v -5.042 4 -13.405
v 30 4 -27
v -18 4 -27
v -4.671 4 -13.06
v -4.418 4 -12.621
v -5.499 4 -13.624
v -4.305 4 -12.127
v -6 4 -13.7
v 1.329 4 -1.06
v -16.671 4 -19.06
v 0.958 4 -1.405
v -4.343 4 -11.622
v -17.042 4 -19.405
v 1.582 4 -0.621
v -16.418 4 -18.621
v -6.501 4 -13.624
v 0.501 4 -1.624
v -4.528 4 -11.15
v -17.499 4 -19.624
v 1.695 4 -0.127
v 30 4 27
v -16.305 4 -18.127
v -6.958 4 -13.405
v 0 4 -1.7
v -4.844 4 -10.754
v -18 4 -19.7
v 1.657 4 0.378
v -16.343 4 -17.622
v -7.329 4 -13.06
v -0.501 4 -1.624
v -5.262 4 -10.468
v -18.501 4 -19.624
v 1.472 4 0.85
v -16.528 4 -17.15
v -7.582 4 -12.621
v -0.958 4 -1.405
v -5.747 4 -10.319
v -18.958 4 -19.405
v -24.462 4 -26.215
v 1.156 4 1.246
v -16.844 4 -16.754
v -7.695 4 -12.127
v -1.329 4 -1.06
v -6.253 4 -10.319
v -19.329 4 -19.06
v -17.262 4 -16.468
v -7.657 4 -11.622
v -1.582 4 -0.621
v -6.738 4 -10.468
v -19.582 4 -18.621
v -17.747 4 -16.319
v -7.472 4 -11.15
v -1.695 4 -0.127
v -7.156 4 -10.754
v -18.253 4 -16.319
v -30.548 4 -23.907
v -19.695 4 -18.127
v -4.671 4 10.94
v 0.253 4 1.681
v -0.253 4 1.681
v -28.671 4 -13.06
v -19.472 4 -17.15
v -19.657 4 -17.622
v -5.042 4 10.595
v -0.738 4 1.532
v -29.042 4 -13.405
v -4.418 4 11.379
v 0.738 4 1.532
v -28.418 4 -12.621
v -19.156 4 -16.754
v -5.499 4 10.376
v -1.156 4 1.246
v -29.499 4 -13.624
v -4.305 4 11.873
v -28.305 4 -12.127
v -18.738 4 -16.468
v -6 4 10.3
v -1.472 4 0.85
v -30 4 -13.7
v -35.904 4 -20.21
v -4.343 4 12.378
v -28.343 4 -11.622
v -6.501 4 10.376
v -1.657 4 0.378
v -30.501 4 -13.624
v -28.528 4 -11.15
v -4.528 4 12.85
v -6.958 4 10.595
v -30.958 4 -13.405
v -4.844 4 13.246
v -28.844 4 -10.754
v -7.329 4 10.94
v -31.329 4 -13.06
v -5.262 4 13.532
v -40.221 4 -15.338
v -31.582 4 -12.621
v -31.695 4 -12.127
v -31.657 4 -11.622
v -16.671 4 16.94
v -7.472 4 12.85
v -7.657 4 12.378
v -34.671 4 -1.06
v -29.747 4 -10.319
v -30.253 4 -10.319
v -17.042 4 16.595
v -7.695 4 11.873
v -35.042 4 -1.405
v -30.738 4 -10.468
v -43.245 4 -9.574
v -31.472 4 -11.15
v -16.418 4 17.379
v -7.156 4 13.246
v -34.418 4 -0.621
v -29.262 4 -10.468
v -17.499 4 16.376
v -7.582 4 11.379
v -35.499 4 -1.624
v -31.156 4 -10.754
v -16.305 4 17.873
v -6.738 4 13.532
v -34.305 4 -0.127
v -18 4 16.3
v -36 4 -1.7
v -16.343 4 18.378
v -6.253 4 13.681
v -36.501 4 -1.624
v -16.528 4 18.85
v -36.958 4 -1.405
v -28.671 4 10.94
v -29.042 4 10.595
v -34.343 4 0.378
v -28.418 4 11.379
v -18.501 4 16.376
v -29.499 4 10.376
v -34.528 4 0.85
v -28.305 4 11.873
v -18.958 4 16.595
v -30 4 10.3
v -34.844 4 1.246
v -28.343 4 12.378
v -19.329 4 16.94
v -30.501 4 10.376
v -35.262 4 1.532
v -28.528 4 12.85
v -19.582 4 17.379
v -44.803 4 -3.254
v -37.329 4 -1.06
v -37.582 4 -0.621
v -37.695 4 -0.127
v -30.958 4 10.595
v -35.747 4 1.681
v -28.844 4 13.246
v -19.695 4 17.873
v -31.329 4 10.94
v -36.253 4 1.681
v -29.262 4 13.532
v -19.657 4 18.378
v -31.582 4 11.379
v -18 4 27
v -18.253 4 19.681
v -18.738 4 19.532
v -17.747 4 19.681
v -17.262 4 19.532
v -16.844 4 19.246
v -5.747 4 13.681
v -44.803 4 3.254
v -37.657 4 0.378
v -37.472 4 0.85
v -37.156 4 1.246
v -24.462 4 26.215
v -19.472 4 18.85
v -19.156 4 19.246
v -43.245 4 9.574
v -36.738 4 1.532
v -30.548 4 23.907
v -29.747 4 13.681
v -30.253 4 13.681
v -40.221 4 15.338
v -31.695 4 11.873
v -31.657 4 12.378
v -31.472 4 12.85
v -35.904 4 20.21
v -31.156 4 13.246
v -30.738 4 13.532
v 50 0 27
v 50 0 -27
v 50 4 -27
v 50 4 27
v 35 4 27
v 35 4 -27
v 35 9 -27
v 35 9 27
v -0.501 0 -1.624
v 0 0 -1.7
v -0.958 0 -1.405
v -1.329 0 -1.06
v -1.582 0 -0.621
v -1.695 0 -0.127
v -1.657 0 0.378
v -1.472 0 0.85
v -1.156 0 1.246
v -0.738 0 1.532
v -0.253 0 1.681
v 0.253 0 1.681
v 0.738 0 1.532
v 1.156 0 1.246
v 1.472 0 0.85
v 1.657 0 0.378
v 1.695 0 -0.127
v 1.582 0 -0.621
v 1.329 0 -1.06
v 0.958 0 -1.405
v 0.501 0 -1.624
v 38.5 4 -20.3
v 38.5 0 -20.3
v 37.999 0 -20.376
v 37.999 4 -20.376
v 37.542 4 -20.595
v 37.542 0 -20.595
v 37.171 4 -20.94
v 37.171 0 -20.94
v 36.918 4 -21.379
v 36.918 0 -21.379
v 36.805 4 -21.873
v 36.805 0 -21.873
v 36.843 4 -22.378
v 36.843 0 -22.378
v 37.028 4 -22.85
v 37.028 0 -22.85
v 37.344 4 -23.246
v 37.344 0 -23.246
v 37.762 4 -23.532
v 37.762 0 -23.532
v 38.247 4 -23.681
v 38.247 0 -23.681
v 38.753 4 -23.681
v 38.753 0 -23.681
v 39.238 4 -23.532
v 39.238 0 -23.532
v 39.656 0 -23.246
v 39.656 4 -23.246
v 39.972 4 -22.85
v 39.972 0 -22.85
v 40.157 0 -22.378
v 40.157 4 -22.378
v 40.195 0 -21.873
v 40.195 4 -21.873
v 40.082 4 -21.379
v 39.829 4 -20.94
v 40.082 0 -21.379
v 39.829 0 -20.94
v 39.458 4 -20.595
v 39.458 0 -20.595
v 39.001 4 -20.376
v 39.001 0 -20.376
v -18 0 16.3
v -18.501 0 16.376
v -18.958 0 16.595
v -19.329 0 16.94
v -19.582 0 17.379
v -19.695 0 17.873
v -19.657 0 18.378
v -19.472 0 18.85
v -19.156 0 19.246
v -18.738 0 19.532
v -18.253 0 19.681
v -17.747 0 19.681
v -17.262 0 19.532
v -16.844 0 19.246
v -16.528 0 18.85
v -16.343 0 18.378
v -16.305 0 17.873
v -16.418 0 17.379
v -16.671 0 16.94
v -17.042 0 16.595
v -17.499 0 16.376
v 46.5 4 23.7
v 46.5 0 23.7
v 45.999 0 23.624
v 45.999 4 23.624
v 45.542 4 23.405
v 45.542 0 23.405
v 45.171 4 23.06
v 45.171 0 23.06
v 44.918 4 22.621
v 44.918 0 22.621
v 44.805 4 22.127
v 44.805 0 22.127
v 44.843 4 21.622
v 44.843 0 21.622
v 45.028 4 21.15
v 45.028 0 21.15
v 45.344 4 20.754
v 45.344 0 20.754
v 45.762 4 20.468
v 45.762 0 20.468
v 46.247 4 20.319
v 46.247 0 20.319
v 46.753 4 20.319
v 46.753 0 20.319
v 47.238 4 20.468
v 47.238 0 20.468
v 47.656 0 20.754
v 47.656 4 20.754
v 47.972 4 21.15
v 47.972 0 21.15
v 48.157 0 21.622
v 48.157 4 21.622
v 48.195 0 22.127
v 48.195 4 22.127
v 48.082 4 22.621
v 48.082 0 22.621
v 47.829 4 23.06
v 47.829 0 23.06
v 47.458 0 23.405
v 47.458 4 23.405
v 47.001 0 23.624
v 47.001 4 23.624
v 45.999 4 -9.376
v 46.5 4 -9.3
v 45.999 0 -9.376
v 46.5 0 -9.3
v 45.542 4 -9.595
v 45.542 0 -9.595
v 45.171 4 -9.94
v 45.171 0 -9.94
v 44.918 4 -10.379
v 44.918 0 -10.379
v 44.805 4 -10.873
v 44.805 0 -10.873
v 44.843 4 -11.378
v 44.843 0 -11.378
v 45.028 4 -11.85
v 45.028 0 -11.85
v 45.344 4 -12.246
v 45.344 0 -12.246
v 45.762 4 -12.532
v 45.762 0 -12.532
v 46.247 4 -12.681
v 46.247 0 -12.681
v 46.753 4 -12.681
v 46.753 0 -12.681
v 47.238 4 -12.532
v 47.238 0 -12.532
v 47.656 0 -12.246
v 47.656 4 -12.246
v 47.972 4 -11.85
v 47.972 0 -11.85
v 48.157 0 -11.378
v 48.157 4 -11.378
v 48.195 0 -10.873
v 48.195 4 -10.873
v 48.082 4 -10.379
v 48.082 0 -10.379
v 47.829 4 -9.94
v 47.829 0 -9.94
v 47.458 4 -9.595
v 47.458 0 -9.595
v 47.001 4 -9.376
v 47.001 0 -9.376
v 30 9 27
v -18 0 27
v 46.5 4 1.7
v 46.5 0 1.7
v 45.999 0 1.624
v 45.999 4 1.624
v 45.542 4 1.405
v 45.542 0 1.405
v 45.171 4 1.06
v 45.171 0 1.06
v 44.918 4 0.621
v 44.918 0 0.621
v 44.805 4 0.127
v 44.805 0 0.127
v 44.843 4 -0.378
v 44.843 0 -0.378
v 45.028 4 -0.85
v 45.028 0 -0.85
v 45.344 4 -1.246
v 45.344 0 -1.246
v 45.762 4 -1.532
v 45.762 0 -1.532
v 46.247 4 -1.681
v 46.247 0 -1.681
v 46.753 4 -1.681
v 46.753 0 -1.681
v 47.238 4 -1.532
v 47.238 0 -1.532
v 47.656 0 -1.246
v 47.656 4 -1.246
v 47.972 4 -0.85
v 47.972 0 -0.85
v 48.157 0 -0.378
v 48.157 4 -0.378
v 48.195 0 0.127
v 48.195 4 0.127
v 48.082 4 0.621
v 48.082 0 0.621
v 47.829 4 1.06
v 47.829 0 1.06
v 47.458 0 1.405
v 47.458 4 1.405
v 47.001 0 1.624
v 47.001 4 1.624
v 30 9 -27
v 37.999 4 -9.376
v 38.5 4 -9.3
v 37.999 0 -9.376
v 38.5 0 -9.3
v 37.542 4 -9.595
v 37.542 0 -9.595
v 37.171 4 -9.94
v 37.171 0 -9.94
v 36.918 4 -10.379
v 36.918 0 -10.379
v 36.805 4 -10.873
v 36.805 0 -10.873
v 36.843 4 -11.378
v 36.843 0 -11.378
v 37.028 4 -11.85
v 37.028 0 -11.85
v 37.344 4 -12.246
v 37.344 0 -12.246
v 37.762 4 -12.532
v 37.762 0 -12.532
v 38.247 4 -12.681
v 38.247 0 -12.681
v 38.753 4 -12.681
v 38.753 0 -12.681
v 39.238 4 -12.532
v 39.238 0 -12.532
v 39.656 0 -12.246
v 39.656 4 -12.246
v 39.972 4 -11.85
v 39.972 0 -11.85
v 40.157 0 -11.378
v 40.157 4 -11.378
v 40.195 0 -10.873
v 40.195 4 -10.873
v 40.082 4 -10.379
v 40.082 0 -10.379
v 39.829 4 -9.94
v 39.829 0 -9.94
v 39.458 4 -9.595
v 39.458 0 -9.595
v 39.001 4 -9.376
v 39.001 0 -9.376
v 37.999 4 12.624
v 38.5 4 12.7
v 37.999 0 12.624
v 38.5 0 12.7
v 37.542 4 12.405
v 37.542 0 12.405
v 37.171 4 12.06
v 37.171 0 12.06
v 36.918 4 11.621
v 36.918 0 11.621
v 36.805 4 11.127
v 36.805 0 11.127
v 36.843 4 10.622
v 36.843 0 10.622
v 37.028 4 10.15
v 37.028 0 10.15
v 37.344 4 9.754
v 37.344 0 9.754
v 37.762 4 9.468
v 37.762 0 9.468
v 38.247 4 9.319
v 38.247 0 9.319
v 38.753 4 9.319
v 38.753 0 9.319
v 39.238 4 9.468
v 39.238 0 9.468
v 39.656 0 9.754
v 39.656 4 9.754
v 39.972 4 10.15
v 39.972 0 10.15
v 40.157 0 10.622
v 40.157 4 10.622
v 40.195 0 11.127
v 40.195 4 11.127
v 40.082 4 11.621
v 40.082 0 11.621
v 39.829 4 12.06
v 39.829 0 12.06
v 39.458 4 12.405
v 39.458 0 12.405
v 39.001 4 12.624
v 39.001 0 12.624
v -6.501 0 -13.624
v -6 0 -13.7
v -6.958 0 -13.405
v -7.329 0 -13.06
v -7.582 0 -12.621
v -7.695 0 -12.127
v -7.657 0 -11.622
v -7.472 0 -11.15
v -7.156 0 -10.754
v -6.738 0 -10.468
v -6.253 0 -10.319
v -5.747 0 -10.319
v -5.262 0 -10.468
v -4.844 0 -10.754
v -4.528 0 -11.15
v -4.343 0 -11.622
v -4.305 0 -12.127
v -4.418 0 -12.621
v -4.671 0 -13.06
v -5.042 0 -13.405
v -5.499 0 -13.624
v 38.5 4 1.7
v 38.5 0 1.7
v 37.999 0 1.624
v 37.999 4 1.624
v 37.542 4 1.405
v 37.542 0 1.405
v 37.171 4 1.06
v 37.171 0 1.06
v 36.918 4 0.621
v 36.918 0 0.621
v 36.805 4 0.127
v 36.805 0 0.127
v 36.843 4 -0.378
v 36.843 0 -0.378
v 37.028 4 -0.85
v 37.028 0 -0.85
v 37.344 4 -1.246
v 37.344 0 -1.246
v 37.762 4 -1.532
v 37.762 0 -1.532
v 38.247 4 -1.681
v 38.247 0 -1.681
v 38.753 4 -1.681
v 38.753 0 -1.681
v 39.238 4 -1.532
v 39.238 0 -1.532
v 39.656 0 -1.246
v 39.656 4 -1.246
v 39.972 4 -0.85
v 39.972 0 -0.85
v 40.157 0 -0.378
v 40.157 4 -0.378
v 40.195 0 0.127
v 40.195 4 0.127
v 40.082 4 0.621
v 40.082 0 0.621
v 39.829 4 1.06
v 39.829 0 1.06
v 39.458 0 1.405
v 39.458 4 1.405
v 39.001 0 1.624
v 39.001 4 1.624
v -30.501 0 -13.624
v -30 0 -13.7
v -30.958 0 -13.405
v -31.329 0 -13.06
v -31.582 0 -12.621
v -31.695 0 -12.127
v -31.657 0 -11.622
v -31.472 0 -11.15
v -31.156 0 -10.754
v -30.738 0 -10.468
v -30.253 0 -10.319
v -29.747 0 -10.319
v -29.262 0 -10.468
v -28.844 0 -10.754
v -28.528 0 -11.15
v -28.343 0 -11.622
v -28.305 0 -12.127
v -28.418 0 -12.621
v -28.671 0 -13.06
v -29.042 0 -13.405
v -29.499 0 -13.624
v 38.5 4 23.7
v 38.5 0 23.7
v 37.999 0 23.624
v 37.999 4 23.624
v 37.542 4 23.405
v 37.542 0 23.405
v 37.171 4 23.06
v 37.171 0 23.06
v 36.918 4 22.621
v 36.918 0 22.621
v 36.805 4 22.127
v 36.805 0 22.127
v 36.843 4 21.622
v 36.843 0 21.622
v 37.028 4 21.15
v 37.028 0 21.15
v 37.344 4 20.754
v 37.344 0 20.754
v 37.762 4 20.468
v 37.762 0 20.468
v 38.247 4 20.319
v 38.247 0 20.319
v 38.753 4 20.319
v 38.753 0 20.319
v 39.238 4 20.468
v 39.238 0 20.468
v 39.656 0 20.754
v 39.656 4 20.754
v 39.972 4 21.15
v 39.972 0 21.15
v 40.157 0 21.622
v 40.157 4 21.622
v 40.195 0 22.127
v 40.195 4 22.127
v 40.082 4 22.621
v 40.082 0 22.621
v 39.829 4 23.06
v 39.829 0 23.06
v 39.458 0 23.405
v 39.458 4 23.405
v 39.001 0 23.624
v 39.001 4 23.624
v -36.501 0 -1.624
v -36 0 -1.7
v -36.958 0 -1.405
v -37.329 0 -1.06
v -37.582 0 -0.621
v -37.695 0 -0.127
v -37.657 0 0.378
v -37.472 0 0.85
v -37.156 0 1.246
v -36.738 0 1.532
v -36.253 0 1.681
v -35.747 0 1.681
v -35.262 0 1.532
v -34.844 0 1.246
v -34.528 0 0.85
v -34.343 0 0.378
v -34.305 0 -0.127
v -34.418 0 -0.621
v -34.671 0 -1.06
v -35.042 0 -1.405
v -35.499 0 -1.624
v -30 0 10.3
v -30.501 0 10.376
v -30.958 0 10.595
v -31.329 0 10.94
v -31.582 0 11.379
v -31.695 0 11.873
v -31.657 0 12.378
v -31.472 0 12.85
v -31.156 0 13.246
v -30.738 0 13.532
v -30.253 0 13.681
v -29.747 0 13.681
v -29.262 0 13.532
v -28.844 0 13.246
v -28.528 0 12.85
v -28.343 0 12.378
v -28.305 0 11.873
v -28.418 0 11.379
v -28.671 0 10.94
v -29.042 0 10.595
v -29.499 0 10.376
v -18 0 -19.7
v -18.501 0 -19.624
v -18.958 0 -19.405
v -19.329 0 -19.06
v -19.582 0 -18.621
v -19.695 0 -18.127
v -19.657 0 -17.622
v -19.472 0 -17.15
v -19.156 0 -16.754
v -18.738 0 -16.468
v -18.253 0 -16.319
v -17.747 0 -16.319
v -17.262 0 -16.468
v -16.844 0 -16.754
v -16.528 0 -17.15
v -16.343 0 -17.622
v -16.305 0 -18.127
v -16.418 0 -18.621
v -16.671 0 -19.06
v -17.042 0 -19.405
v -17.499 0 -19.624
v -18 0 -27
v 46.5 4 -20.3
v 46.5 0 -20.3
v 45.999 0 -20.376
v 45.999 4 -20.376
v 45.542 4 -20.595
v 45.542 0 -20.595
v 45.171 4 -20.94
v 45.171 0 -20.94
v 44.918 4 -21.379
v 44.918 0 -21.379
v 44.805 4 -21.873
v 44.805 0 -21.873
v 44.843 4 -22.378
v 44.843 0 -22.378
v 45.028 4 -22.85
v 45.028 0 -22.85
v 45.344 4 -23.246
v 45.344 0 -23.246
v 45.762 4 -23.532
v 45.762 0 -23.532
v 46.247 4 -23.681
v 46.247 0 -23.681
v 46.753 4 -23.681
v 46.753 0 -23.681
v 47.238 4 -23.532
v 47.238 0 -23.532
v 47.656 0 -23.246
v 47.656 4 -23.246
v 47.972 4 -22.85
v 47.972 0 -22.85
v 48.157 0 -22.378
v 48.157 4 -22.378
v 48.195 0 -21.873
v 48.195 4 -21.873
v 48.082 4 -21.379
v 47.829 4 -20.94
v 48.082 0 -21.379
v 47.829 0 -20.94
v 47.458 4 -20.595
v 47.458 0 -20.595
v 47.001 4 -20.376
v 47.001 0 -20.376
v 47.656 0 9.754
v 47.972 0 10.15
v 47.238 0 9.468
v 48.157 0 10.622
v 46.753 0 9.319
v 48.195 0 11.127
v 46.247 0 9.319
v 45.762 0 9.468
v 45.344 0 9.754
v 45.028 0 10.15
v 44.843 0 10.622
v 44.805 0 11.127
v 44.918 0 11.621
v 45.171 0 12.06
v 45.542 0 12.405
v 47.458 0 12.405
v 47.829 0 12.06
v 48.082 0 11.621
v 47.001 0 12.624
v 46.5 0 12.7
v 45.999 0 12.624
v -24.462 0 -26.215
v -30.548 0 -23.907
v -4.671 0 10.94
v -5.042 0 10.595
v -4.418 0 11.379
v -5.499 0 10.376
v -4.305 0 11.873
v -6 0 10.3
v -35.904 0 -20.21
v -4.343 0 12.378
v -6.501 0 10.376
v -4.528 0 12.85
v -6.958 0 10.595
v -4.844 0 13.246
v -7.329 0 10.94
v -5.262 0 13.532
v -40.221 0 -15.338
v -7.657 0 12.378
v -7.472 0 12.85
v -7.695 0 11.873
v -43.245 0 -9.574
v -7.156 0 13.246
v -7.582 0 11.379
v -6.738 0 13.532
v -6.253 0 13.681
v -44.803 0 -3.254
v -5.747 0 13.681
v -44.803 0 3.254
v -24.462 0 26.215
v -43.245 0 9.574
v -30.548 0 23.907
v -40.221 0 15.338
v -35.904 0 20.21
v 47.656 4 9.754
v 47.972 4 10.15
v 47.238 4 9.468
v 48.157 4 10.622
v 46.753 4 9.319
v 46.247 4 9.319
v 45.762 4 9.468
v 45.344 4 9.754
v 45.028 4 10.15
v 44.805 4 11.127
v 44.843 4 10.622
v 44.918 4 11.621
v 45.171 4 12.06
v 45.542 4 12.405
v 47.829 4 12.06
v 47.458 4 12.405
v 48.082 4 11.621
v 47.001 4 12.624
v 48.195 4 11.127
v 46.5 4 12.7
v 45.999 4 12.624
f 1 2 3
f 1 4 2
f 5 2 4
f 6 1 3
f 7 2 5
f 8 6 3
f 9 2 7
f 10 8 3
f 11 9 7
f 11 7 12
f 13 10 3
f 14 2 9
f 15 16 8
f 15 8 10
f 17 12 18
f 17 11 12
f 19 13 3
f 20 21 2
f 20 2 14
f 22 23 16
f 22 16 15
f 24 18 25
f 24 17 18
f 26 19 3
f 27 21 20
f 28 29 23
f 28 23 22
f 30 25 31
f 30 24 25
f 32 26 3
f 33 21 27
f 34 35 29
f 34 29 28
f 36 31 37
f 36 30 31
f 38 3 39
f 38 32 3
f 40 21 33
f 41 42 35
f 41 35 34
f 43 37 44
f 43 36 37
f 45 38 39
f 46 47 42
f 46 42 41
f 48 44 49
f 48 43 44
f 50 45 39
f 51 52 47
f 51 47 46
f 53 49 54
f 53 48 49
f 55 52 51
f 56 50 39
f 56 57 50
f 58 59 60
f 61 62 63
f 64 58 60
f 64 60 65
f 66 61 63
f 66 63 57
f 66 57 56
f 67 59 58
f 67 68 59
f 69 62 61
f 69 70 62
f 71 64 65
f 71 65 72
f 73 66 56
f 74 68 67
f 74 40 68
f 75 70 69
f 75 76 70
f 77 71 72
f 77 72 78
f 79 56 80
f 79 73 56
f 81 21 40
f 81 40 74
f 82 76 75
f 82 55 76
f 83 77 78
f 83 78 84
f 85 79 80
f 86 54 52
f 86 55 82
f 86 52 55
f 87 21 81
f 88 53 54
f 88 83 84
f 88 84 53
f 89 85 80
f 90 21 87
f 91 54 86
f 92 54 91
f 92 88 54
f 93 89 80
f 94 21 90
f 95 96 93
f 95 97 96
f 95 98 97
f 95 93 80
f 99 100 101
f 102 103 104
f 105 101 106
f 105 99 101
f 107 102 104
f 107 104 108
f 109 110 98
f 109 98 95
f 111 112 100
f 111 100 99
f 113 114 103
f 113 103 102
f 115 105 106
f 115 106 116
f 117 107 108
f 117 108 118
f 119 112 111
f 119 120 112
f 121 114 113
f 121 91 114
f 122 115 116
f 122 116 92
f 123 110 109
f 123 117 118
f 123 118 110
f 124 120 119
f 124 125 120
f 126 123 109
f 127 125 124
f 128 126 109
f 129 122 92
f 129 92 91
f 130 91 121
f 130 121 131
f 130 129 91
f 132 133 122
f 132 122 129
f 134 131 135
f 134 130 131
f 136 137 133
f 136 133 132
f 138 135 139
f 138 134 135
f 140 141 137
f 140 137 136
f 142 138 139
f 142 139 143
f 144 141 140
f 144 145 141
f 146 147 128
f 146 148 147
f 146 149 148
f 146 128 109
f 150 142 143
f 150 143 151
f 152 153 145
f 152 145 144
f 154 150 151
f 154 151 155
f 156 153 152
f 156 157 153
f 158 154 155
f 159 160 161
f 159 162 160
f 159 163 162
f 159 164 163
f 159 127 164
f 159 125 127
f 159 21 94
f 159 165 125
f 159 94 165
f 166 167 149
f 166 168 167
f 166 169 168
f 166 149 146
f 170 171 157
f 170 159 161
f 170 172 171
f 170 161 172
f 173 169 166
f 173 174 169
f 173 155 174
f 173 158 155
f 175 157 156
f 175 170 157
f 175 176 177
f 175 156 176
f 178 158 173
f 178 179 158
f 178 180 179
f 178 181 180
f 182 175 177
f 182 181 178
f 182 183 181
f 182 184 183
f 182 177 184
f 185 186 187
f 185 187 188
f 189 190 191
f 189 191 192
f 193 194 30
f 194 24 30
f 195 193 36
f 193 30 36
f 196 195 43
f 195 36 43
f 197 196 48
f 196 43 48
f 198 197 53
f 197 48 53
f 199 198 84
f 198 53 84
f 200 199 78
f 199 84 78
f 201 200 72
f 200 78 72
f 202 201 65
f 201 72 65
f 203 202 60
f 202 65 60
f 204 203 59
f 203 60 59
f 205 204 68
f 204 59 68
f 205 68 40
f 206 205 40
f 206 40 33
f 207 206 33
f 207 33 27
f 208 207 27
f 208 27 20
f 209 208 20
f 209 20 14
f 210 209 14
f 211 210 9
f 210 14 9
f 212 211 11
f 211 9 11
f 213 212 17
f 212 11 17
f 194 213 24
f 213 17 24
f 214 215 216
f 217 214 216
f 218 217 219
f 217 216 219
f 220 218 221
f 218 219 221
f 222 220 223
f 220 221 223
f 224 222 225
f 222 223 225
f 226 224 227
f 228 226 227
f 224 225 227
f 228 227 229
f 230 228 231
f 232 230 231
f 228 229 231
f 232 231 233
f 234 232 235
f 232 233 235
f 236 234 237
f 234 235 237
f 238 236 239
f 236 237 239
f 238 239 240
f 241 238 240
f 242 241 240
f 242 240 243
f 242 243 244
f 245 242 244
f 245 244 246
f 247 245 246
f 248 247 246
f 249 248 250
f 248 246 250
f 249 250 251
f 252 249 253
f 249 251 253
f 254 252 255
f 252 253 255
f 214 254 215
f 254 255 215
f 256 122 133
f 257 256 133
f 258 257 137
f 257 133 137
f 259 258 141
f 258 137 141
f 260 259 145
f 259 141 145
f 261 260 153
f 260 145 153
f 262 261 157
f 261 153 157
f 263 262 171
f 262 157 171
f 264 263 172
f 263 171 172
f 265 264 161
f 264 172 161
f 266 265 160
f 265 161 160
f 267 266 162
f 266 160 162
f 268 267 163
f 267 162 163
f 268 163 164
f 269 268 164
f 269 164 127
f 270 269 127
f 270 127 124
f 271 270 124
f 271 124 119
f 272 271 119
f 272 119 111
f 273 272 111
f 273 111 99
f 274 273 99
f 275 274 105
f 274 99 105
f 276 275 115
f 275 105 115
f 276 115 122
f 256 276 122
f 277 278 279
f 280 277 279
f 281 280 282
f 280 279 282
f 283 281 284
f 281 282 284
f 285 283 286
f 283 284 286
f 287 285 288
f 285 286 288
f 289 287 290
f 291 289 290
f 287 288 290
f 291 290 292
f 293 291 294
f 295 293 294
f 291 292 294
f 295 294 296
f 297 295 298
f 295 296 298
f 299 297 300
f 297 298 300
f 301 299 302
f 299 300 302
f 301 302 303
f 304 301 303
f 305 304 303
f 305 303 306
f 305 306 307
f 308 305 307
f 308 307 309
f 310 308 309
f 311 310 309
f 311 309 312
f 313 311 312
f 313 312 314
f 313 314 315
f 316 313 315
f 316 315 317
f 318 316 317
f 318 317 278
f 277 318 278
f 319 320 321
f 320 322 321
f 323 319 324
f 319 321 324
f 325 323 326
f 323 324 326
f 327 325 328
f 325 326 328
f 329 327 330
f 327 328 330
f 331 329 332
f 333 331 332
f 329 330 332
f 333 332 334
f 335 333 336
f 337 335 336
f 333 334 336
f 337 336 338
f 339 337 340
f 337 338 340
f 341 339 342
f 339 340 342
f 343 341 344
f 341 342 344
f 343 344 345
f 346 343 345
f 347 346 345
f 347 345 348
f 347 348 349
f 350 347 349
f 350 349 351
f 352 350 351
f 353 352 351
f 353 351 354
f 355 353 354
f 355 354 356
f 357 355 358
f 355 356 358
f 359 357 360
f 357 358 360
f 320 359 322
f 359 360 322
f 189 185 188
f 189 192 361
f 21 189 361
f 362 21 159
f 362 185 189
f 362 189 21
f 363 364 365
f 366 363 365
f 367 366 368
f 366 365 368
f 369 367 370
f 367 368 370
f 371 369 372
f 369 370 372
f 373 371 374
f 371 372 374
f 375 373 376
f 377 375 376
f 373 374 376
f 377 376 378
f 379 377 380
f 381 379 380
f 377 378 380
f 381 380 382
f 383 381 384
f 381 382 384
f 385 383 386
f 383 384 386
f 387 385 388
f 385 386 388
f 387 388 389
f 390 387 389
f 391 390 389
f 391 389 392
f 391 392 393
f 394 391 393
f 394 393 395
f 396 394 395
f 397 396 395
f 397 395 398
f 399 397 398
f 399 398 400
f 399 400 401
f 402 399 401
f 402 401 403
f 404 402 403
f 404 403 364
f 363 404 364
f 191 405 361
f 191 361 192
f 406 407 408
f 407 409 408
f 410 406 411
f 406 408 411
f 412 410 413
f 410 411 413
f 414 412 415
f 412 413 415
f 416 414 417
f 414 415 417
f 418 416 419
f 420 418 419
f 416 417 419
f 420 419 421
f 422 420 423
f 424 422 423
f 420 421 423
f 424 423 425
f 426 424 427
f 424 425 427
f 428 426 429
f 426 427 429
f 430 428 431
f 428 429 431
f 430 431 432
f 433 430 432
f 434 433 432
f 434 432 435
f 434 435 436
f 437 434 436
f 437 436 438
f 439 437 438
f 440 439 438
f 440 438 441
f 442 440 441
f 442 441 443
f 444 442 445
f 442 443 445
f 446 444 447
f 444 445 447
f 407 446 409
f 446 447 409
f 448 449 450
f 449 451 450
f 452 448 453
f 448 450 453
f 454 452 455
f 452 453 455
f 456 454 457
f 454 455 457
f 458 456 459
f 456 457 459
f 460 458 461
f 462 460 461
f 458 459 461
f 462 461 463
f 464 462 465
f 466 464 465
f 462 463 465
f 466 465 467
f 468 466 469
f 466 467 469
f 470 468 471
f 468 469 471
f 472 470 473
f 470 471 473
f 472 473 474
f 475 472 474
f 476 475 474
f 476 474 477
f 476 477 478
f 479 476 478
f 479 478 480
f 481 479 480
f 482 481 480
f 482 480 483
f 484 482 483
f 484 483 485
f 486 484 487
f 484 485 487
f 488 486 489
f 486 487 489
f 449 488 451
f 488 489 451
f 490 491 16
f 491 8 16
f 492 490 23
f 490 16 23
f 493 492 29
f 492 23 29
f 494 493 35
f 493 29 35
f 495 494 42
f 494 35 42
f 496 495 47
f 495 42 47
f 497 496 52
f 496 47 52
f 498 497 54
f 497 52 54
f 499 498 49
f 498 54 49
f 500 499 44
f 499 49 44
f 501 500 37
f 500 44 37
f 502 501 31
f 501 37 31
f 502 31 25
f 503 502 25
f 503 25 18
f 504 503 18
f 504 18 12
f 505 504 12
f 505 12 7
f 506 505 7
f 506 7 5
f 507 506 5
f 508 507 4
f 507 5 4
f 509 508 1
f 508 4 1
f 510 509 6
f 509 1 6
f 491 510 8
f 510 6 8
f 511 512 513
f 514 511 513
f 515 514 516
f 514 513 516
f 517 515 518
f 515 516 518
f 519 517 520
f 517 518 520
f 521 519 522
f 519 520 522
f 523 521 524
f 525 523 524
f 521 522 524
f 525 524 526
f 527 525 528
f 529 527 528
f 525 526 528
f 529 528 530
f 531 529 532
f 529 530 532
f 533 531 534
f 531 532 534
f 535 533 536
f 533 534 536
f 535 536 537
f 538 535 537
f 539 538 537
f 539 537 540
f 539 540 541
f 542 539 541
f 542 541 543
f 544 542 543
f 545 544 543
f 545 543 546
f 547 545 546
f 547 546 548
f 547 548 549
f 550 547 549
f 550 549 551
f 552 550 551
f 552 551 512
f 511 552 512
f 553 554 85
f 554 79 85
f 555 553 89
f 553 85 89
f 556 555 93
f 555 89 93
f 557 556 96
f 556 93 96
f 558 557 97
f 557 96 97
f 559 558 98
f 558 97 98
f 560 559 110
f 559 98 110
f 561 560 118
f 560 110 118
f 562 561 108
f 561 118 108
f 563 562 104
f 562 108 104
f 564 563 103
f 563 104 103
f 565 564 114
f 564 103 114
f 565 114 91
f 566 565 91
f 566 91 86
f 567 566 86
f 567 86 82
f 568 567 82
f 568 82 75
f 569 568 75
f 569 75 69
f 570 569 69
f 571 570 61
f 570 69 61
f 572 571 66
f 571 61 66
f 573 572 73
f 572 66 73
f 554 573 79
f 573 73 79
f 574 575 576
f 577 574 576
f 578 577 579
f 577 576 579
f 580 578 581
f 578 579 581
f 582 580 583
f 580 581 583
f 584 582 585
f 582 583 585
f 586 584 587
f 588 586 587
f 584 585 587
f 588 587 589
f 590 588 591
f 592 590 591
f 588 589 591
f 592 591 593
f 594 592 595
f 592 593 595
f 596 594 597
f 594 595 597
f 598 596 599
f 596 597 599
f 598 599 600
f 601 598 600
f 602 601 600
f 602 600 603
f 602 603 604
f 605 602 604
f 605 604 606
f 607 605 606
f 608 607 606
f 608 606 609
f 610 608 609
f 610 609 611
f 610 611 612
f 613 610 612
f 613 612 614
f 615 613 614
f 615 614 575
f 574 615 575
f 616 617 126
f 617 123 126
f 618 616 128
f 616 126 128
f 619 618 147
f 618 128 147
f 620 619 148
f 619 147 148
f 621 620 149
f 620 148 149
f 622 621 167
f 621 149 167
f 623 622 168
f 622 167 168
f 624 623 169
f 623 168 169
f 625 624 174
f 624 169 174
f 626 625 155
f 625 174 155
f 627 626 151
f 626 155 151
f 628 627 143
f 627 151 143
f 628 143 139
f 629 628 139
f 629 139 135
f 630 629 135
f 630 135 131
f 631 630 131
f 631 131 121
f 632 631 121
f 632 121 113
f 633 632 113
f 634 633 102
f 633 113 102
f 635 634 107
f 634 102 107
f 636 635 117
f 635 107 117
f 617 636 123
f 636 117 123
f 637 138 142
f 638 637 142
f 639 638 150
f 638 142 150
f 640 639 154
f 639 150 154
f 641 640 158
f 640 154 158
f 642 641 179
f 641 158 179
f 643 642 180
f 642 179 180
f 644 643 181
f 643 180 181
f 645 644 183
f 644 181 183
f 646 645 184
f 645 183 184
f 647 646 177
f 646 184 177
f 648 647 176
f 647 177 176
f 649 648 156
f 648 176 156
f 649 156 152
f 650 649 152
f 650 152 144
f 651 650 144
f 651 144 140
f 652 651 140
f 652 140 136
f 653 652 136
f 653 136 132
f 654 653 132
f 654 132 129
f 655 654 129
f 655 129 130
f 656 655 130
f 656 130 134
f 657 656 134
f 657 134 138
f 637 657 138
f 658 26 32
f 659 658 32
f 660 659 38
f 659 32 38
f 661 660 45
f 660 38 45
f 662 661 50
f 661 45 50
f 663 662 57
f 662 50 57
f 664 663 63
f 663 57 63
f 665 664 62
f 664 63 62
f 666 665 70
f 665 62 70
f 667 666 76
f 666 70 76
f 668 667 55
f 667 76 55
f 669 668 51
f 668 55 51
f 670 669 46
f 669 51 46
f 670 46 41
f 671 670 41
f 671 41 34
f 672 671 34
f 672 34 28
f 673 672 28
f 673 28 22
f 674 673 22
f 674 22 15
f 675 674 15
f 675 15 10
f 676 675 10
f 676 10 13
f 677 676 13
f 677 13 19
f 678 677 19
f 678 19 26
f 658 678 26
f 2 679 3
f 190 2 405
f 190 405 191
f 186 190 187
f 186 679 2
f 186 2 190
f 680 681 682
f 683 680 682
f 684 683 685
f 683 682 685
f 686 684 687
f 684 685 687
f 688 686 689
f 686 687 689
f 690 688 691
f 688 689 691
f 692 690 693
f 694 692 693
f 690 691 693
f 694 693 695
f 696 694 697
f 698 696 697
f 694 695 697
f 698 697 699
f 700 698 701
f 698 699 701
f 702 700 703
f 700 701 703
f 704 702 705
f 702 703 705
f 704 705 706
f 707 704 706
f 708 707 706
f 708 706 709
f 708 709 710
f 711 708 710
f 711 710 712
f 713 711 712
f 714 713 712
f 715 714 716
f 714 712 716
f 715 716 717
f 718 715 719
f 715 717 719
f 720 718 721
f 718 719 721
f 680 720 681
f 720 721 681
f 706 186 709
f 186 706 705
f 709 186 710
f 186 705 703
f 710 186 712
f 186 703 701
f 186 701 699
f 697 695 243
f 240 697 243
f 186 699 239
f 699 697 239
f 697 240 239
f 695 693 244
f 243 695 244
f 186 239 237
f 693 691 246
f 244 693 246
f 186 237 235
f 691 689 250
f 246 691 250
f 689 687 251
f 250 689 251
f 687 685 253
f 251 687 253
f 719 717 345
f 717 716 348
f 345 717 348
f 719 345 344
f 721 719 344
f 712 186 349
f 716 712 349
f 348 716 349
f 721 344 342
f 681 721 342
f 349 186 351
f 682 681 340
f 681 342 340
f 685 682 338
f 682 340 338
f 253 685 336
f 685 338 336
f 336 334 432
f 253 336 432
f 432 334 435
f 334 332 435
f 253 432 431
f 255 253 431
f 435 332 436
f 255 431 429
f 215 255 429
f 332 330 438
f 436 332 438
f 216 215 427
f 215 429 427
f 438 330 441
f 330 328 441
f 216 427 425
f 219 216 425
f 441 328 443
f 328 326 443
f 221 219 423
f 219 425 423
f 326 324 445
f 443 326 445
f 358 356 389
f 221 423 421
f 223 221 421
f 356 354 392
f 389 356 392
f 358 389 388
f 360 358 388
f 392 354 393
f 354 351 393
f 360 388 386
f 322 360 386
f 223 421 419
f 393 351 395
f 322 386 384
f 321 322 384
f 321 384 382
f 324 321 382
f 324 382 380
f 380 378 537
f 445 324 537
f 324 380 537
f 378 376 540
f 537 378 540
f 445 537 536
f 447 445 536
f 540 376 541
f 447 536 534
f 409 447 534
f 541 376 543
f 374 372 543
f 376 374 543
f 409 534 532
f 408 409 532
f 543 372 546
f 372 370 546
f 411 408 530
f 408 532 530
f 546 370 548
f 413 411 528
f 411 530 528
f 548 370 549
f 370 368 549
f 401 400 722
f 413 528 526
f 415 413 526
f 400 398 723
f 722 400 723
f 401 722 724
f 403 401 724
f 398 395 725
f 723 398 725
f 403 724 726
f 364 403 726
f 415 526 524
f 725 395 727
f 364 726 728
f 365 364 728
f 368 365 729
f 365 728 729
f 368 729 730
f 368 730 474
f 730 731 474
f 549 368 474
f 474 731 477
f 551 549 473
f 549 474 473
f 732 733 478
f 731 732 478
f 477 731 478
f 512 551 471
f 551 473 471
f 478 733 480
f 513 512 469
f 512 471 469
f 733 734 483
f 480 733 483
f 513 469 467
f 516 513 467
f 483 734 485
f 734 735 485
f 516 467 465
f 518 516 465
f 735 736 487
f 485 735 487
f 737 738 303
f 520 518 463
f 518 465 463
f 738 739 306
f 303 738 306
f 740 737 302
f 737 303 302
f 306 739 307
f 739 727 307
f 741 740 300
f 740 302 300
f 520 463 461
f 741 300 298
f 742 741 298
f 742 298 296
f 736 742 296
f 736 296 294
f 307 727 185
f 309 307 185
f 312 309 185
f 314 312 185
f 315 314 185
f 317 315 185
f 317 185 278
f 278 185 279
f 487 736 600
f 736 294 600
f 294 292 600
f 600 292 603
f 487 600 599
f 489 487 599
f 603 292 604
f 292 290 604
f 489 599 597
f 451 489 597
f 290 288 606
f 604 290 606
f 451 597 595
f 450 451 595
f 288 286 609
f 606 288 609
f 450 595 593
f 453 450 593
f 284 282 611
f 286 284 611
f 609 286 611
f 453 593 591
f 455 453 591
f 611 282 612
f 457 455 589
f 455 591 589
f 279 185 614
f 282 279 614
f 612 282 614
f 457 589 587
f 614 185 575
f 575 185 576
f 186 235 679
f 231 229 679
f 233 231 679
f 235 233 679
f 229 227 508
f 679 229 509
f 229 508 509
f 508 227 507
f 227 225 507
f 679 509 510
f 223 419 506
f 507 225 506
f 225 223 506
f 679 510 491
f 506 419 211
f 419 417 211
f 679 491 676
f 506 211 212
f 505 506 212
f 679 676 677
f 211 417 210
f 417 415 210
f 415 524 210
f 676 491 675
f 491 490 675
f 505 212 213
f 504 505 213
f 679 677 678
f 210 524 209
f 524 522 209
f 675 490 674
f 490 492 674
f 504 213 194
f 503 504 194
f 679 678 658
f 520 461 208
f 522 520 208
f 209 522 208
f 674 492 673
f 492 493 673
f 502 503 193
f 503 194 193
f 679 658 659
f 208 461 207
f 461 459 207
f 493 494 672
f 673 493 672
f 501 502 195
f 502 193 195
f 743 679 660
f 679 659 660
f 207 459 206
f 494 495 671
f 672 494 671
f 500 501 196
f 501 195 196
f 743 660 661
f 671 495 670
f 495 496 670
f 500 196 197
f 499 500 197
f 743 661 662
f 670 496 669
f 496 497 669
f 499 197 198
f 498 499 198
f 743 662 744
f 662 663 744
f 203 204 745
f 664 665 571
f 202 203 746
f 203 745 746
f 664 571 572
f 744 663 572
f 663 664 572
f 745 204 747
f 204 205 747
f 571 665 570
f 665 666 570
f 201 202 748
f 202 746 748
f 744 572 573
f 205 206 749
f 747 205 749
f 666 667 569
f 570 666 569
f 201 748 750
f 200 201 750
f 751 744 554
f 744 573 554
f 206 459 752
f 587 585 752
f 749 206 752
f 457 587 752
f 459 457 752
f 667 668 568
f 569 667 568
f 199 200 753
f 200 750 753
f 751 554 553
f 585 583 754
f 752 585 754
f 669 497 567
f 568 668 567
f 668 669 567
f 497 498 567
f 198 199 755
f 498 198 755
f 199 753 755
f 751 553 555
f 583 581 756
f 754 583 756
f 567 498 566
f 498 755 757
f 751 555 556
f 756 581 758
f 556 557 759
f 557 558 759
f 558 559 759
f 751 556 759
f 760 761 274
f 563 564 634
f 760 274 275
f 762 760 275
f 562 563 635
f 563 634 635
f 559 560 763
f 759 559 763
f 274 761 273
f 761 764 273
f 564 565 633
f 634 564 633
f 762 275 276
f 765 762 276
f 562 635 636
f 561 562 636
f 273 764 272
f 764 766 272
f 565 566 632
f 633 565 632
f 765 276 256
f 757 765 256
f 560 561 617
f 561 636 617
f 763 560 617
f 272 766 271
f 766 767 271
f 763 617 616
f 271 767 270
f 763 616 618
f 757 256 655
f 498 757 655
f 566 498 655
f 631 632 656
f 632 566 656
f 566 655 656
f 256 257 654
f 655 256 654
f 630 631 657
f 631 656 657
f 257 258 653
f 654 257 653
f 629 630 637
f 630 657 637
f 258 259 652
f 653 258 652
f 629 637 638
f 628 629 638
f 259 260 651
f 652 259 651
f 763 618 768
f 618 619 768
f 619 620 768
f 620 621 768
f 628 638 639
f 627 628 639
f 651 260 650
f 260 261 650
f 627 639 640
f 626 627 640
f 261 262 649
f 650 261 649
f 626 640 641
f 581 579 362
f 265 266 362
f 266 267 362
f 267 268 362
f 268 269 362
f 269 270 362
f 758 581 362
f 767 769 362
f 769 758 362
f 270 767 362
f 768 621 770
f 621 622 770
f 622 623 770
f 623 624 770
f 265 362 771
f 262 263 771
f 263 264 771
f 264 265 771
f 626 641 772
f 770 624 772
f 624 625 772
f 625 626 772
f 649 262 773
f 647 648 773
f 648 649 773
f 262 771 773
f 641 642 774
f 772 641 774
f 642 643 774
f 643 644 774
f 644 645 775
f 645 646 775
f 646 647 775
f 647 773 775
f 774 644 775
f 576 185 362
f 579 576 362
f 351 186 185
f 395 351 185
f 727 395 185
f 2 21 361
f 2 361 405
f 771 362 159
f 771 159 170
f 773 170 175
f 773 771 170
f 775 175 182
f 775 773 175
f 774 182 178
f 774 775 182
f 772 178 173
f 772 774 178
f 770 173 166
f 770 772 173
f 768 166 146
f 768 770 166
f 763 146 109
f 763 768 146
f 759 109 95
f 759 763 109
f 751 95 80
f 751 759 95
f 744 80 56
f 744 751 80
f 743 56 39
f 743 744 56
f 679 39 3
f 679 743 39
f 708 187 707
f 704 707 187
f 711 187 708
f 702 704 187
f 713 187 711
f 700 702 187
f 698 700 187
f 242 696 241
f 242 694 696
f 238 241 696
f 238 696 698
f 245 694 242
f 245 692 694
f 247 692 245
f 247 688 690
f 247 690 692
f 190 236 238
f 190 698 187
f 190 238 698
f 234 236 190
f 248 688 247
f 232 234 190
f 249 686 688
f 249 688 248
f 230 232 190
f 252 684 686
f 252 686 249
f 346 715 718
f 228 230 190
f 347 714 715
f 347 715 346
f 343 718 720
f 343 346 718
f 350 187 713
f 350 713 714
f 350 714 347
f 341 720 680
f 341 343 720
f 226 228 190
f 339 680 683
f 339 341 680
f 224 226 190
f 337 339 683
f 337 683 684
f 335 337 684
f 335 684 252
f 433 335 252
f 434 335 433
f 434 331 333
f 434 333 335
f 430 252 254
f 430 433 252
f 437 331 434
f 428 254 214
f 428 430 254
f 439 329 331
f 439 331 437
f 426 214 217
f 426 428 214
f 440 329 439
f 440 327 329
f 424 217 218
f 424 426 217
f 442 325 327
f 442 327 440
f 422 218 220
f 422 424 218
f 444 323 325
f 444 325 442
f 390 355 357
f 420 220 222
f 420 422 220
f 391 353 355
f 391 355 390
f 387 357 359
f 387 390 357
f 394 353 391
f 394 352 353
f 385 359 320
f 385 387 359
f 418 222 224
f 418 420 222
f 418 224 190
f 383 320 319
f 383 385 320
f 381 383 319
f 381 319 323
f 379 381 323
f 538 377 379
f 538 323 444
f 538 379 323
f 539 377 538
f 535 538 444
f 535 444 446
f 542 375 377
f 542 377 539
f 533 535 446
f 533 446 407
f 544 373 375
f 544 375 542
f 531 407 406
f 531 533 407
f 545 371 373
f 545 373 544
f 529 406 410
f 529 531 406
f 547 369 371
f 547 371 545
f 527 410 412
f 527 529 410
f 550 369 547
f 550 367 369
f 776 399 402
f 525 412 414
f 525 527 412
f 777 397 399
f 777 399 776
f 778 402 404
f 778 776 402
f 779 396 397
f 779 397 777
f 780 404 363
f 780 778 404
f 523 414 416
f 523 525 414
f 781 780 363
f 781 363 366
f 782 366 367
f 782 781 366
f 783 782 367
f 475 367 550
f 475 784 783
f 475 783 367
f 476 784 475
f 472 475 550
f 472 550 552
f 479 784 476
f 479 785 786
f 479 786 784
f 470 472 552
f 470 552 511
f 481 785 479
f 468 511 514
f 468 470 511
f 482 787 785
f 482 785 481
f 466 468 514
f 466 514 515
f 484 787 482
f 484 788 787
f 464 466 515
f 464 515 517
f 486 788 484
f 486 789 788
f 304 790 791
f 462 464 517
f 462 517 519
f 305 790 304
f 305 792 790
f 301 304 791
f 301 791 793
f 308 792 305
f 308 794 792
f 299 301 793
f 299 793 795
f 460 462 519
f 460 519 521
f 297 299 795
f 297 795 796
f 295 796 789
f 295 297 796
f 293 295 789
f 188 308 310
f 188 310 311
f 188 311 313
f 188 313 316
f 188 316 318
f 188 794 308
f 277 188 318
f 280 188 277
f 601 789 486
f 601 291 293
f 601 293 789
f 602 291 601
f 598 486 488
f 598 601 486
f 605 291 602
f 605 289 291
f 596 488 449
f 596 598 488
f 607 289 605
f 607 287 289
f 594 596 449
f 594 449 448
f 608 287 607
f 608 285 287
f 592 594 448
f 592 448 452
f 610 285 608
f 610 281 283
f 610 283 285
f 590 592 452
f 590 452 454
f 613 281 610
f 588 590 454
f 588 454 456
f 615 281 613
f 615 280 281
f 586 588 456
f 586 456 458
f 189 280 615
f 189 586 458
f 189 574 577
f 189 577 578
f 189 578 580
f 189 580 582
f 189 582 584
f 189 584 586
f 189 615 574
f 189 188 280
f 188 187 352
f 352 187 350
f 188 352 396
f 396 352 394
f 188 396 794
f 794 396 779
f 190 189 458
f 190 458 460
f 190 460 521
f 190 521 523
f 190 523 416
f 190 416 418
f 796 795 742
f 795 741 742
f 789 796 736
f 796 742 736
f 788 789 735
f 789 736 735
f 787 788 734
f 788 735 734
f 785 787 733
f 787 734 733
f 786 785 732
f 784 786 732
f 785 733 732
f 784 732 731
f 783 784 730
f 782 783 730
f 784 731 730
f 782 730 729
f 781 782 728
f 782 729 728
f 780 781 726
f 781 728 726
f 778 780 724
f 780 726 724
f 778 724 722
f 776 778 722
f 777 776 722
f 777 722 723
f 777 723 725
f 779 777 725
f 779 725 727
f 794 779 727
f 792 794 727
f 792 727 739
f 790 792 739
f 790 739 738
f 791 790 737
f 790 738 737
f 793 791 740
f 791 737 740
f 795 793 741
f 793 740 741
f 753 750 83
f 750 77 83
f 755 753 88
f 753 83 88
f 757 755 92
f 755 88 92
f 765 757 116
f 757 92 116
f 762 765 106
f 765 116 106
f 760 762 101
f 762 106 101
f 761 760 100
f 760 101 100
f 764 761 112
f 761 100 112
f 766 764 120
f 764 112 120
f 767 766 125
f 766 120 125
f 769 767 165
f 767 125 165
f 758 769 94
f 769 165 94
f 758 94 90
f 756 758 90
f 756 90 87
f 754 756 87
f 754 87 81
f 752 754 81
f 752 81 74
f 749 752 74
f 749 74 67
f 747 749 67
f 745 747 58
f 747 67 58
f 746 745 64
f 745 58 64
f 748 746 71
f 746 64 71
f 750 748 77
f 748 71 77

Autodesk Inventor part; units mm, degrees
ref_plane "YZ Plane" through (0, 0, 0) normal (1, 0, 0) x (0, 1, 0)
ref_plane "XZ Plane" through (0, 0, 0) normal (0, 1, 0) x (-1, 0, 0)
ref_plane "XY Plane" through (0, 0, 0) normal (0, 0, 1) x (1, 0, 0)
sketch "Skizze1" plane through (0, 0, 0) normal (0, 1, 0) x (-1, 0, 0)
  line L0 (-50, 27) -> (50, 27)
  line L1 (50, 27) -> (50, -27) construction
  line L2 (50, -27) -> (-50, -27)
  line L3 (-50, -27) -> (-50, 27)
  line L4 (-50, 27) -> (50, -27) construction
  line L5 (50, 27) -> (-50, -27) construction
  line L6 (0, 0) -> (66.4326, 0) construction
  arc A0 (18, -27) -> (18, 27) centre (18, 0) ccw
  dimension "d0" = 54
  dimension "d1" = 100
  dimension "d12" = 68
  dimension "d13" = 90
extrude "Extrusion1" add sketch "Skizze1" along normal blind 4
sketch "Skizze5" plane through (0, 4, 0) normal (0, 1, 0) x (1, 0, 0)
  line L0 (-18, -27) -> (50, -27) projected
  line L1 (50, -27) -> (50, 27) projected
  line L2 (50, 27) -> (-18, 27) projected
  arc A0 (-18, 27) -> (-18, -27) centre (-18, 0) ccw projected
  line L3 (35, -27) -> (30, -27)
  line L4 (30, -27) -> (30, 27)
  line L5 (30, 27) -> (35, 27)
  line L6 (35, 27) -> (35, -27)
  point P0 (0, 0)
  dimension "d14" = 15
  dimension "d15" = 5
extrude "Extrusion4" add sketch "Skizze5" along normal blind 5 contours L4 L2 L6 L0
sketch "Skizze6" plane through (0, 4, 0) normal (0, 1, 0) x (1, 0, 0)
  line L0 (35, 27) -> (35, -27) projected
  line L1 (35, -27) -> (50, -27) projected
  line L2 (50, -27) -> (50, 27) projected
  line L3 (50, 27) -> (35, 27) projected
  line L4 (0, 0) -> (67.4565, 0) construction
  point P0 (46.5, 0)
  dimension "d18" = 3.5
hole "Bohrung1" at (46.5, 4, 0) direction (0, -1, 0) diameter 3.4 end through all clearance for "Inbusschraube ISO 4762" size "M3" standard "ISO"
pattern_linear "Rechteckige Anordnung1" count 5 spacing 11 along (0, 0, -1) count 2 spacing 8 along (-1, 0, 0) of "Bohrung1" first direction both ways yes
sketch "Skizze7" plane through (0, 0, 0) normal (0, -1, 0) x (1, 0, 0)
  arc A0 (-18, 27) -> (-18, -27) centre (-18, 0) ccw projected
  line L0 (-6, 12) -> (-30, 12)
  line L1 (-30, 12) -> (-30, -12)
  line L2 (-30, -12) -> (-6, -12)
  line L3 (-6, -12) -> (-6, 12)
  line L4 (-6, 12) -> (-30, -12) construction
  line L5 (-36, 18) -> (0, -18) construction
  circle A1 centre (-18, 0) radius 18
  line L6 (-18, 22.4057) -> (-18, -22.4722) construction
  line L7 (3.1609, 0) -> (-39.488, 0) construction
  point P0 (0, 0)
  point P1 (-18, -18)
  point P2 (-36, 0)
  point P3 (-18, 18)
  point P4 (0, 0)
  dimension "d32" = 24
  dimension "d33" = 24
  dimension "d35" = 36
hole "Bohrung2" at (-18, 0, -18) at (-36, 0, 0) at (-18, 0, 18) at (0, 0, 0) at (-6, 0, -12) at (-30, 0, -12) at (-30, 0, 12) at (-6, 0, 12) direction (0, 1, 0) diameter 3.4 end through all clearance for "Inbusschraube ISO 4762" size "M3" standard "ISO"
properties part number "dynamixel_pro_frame_part3" material "Aluminium 6061"
